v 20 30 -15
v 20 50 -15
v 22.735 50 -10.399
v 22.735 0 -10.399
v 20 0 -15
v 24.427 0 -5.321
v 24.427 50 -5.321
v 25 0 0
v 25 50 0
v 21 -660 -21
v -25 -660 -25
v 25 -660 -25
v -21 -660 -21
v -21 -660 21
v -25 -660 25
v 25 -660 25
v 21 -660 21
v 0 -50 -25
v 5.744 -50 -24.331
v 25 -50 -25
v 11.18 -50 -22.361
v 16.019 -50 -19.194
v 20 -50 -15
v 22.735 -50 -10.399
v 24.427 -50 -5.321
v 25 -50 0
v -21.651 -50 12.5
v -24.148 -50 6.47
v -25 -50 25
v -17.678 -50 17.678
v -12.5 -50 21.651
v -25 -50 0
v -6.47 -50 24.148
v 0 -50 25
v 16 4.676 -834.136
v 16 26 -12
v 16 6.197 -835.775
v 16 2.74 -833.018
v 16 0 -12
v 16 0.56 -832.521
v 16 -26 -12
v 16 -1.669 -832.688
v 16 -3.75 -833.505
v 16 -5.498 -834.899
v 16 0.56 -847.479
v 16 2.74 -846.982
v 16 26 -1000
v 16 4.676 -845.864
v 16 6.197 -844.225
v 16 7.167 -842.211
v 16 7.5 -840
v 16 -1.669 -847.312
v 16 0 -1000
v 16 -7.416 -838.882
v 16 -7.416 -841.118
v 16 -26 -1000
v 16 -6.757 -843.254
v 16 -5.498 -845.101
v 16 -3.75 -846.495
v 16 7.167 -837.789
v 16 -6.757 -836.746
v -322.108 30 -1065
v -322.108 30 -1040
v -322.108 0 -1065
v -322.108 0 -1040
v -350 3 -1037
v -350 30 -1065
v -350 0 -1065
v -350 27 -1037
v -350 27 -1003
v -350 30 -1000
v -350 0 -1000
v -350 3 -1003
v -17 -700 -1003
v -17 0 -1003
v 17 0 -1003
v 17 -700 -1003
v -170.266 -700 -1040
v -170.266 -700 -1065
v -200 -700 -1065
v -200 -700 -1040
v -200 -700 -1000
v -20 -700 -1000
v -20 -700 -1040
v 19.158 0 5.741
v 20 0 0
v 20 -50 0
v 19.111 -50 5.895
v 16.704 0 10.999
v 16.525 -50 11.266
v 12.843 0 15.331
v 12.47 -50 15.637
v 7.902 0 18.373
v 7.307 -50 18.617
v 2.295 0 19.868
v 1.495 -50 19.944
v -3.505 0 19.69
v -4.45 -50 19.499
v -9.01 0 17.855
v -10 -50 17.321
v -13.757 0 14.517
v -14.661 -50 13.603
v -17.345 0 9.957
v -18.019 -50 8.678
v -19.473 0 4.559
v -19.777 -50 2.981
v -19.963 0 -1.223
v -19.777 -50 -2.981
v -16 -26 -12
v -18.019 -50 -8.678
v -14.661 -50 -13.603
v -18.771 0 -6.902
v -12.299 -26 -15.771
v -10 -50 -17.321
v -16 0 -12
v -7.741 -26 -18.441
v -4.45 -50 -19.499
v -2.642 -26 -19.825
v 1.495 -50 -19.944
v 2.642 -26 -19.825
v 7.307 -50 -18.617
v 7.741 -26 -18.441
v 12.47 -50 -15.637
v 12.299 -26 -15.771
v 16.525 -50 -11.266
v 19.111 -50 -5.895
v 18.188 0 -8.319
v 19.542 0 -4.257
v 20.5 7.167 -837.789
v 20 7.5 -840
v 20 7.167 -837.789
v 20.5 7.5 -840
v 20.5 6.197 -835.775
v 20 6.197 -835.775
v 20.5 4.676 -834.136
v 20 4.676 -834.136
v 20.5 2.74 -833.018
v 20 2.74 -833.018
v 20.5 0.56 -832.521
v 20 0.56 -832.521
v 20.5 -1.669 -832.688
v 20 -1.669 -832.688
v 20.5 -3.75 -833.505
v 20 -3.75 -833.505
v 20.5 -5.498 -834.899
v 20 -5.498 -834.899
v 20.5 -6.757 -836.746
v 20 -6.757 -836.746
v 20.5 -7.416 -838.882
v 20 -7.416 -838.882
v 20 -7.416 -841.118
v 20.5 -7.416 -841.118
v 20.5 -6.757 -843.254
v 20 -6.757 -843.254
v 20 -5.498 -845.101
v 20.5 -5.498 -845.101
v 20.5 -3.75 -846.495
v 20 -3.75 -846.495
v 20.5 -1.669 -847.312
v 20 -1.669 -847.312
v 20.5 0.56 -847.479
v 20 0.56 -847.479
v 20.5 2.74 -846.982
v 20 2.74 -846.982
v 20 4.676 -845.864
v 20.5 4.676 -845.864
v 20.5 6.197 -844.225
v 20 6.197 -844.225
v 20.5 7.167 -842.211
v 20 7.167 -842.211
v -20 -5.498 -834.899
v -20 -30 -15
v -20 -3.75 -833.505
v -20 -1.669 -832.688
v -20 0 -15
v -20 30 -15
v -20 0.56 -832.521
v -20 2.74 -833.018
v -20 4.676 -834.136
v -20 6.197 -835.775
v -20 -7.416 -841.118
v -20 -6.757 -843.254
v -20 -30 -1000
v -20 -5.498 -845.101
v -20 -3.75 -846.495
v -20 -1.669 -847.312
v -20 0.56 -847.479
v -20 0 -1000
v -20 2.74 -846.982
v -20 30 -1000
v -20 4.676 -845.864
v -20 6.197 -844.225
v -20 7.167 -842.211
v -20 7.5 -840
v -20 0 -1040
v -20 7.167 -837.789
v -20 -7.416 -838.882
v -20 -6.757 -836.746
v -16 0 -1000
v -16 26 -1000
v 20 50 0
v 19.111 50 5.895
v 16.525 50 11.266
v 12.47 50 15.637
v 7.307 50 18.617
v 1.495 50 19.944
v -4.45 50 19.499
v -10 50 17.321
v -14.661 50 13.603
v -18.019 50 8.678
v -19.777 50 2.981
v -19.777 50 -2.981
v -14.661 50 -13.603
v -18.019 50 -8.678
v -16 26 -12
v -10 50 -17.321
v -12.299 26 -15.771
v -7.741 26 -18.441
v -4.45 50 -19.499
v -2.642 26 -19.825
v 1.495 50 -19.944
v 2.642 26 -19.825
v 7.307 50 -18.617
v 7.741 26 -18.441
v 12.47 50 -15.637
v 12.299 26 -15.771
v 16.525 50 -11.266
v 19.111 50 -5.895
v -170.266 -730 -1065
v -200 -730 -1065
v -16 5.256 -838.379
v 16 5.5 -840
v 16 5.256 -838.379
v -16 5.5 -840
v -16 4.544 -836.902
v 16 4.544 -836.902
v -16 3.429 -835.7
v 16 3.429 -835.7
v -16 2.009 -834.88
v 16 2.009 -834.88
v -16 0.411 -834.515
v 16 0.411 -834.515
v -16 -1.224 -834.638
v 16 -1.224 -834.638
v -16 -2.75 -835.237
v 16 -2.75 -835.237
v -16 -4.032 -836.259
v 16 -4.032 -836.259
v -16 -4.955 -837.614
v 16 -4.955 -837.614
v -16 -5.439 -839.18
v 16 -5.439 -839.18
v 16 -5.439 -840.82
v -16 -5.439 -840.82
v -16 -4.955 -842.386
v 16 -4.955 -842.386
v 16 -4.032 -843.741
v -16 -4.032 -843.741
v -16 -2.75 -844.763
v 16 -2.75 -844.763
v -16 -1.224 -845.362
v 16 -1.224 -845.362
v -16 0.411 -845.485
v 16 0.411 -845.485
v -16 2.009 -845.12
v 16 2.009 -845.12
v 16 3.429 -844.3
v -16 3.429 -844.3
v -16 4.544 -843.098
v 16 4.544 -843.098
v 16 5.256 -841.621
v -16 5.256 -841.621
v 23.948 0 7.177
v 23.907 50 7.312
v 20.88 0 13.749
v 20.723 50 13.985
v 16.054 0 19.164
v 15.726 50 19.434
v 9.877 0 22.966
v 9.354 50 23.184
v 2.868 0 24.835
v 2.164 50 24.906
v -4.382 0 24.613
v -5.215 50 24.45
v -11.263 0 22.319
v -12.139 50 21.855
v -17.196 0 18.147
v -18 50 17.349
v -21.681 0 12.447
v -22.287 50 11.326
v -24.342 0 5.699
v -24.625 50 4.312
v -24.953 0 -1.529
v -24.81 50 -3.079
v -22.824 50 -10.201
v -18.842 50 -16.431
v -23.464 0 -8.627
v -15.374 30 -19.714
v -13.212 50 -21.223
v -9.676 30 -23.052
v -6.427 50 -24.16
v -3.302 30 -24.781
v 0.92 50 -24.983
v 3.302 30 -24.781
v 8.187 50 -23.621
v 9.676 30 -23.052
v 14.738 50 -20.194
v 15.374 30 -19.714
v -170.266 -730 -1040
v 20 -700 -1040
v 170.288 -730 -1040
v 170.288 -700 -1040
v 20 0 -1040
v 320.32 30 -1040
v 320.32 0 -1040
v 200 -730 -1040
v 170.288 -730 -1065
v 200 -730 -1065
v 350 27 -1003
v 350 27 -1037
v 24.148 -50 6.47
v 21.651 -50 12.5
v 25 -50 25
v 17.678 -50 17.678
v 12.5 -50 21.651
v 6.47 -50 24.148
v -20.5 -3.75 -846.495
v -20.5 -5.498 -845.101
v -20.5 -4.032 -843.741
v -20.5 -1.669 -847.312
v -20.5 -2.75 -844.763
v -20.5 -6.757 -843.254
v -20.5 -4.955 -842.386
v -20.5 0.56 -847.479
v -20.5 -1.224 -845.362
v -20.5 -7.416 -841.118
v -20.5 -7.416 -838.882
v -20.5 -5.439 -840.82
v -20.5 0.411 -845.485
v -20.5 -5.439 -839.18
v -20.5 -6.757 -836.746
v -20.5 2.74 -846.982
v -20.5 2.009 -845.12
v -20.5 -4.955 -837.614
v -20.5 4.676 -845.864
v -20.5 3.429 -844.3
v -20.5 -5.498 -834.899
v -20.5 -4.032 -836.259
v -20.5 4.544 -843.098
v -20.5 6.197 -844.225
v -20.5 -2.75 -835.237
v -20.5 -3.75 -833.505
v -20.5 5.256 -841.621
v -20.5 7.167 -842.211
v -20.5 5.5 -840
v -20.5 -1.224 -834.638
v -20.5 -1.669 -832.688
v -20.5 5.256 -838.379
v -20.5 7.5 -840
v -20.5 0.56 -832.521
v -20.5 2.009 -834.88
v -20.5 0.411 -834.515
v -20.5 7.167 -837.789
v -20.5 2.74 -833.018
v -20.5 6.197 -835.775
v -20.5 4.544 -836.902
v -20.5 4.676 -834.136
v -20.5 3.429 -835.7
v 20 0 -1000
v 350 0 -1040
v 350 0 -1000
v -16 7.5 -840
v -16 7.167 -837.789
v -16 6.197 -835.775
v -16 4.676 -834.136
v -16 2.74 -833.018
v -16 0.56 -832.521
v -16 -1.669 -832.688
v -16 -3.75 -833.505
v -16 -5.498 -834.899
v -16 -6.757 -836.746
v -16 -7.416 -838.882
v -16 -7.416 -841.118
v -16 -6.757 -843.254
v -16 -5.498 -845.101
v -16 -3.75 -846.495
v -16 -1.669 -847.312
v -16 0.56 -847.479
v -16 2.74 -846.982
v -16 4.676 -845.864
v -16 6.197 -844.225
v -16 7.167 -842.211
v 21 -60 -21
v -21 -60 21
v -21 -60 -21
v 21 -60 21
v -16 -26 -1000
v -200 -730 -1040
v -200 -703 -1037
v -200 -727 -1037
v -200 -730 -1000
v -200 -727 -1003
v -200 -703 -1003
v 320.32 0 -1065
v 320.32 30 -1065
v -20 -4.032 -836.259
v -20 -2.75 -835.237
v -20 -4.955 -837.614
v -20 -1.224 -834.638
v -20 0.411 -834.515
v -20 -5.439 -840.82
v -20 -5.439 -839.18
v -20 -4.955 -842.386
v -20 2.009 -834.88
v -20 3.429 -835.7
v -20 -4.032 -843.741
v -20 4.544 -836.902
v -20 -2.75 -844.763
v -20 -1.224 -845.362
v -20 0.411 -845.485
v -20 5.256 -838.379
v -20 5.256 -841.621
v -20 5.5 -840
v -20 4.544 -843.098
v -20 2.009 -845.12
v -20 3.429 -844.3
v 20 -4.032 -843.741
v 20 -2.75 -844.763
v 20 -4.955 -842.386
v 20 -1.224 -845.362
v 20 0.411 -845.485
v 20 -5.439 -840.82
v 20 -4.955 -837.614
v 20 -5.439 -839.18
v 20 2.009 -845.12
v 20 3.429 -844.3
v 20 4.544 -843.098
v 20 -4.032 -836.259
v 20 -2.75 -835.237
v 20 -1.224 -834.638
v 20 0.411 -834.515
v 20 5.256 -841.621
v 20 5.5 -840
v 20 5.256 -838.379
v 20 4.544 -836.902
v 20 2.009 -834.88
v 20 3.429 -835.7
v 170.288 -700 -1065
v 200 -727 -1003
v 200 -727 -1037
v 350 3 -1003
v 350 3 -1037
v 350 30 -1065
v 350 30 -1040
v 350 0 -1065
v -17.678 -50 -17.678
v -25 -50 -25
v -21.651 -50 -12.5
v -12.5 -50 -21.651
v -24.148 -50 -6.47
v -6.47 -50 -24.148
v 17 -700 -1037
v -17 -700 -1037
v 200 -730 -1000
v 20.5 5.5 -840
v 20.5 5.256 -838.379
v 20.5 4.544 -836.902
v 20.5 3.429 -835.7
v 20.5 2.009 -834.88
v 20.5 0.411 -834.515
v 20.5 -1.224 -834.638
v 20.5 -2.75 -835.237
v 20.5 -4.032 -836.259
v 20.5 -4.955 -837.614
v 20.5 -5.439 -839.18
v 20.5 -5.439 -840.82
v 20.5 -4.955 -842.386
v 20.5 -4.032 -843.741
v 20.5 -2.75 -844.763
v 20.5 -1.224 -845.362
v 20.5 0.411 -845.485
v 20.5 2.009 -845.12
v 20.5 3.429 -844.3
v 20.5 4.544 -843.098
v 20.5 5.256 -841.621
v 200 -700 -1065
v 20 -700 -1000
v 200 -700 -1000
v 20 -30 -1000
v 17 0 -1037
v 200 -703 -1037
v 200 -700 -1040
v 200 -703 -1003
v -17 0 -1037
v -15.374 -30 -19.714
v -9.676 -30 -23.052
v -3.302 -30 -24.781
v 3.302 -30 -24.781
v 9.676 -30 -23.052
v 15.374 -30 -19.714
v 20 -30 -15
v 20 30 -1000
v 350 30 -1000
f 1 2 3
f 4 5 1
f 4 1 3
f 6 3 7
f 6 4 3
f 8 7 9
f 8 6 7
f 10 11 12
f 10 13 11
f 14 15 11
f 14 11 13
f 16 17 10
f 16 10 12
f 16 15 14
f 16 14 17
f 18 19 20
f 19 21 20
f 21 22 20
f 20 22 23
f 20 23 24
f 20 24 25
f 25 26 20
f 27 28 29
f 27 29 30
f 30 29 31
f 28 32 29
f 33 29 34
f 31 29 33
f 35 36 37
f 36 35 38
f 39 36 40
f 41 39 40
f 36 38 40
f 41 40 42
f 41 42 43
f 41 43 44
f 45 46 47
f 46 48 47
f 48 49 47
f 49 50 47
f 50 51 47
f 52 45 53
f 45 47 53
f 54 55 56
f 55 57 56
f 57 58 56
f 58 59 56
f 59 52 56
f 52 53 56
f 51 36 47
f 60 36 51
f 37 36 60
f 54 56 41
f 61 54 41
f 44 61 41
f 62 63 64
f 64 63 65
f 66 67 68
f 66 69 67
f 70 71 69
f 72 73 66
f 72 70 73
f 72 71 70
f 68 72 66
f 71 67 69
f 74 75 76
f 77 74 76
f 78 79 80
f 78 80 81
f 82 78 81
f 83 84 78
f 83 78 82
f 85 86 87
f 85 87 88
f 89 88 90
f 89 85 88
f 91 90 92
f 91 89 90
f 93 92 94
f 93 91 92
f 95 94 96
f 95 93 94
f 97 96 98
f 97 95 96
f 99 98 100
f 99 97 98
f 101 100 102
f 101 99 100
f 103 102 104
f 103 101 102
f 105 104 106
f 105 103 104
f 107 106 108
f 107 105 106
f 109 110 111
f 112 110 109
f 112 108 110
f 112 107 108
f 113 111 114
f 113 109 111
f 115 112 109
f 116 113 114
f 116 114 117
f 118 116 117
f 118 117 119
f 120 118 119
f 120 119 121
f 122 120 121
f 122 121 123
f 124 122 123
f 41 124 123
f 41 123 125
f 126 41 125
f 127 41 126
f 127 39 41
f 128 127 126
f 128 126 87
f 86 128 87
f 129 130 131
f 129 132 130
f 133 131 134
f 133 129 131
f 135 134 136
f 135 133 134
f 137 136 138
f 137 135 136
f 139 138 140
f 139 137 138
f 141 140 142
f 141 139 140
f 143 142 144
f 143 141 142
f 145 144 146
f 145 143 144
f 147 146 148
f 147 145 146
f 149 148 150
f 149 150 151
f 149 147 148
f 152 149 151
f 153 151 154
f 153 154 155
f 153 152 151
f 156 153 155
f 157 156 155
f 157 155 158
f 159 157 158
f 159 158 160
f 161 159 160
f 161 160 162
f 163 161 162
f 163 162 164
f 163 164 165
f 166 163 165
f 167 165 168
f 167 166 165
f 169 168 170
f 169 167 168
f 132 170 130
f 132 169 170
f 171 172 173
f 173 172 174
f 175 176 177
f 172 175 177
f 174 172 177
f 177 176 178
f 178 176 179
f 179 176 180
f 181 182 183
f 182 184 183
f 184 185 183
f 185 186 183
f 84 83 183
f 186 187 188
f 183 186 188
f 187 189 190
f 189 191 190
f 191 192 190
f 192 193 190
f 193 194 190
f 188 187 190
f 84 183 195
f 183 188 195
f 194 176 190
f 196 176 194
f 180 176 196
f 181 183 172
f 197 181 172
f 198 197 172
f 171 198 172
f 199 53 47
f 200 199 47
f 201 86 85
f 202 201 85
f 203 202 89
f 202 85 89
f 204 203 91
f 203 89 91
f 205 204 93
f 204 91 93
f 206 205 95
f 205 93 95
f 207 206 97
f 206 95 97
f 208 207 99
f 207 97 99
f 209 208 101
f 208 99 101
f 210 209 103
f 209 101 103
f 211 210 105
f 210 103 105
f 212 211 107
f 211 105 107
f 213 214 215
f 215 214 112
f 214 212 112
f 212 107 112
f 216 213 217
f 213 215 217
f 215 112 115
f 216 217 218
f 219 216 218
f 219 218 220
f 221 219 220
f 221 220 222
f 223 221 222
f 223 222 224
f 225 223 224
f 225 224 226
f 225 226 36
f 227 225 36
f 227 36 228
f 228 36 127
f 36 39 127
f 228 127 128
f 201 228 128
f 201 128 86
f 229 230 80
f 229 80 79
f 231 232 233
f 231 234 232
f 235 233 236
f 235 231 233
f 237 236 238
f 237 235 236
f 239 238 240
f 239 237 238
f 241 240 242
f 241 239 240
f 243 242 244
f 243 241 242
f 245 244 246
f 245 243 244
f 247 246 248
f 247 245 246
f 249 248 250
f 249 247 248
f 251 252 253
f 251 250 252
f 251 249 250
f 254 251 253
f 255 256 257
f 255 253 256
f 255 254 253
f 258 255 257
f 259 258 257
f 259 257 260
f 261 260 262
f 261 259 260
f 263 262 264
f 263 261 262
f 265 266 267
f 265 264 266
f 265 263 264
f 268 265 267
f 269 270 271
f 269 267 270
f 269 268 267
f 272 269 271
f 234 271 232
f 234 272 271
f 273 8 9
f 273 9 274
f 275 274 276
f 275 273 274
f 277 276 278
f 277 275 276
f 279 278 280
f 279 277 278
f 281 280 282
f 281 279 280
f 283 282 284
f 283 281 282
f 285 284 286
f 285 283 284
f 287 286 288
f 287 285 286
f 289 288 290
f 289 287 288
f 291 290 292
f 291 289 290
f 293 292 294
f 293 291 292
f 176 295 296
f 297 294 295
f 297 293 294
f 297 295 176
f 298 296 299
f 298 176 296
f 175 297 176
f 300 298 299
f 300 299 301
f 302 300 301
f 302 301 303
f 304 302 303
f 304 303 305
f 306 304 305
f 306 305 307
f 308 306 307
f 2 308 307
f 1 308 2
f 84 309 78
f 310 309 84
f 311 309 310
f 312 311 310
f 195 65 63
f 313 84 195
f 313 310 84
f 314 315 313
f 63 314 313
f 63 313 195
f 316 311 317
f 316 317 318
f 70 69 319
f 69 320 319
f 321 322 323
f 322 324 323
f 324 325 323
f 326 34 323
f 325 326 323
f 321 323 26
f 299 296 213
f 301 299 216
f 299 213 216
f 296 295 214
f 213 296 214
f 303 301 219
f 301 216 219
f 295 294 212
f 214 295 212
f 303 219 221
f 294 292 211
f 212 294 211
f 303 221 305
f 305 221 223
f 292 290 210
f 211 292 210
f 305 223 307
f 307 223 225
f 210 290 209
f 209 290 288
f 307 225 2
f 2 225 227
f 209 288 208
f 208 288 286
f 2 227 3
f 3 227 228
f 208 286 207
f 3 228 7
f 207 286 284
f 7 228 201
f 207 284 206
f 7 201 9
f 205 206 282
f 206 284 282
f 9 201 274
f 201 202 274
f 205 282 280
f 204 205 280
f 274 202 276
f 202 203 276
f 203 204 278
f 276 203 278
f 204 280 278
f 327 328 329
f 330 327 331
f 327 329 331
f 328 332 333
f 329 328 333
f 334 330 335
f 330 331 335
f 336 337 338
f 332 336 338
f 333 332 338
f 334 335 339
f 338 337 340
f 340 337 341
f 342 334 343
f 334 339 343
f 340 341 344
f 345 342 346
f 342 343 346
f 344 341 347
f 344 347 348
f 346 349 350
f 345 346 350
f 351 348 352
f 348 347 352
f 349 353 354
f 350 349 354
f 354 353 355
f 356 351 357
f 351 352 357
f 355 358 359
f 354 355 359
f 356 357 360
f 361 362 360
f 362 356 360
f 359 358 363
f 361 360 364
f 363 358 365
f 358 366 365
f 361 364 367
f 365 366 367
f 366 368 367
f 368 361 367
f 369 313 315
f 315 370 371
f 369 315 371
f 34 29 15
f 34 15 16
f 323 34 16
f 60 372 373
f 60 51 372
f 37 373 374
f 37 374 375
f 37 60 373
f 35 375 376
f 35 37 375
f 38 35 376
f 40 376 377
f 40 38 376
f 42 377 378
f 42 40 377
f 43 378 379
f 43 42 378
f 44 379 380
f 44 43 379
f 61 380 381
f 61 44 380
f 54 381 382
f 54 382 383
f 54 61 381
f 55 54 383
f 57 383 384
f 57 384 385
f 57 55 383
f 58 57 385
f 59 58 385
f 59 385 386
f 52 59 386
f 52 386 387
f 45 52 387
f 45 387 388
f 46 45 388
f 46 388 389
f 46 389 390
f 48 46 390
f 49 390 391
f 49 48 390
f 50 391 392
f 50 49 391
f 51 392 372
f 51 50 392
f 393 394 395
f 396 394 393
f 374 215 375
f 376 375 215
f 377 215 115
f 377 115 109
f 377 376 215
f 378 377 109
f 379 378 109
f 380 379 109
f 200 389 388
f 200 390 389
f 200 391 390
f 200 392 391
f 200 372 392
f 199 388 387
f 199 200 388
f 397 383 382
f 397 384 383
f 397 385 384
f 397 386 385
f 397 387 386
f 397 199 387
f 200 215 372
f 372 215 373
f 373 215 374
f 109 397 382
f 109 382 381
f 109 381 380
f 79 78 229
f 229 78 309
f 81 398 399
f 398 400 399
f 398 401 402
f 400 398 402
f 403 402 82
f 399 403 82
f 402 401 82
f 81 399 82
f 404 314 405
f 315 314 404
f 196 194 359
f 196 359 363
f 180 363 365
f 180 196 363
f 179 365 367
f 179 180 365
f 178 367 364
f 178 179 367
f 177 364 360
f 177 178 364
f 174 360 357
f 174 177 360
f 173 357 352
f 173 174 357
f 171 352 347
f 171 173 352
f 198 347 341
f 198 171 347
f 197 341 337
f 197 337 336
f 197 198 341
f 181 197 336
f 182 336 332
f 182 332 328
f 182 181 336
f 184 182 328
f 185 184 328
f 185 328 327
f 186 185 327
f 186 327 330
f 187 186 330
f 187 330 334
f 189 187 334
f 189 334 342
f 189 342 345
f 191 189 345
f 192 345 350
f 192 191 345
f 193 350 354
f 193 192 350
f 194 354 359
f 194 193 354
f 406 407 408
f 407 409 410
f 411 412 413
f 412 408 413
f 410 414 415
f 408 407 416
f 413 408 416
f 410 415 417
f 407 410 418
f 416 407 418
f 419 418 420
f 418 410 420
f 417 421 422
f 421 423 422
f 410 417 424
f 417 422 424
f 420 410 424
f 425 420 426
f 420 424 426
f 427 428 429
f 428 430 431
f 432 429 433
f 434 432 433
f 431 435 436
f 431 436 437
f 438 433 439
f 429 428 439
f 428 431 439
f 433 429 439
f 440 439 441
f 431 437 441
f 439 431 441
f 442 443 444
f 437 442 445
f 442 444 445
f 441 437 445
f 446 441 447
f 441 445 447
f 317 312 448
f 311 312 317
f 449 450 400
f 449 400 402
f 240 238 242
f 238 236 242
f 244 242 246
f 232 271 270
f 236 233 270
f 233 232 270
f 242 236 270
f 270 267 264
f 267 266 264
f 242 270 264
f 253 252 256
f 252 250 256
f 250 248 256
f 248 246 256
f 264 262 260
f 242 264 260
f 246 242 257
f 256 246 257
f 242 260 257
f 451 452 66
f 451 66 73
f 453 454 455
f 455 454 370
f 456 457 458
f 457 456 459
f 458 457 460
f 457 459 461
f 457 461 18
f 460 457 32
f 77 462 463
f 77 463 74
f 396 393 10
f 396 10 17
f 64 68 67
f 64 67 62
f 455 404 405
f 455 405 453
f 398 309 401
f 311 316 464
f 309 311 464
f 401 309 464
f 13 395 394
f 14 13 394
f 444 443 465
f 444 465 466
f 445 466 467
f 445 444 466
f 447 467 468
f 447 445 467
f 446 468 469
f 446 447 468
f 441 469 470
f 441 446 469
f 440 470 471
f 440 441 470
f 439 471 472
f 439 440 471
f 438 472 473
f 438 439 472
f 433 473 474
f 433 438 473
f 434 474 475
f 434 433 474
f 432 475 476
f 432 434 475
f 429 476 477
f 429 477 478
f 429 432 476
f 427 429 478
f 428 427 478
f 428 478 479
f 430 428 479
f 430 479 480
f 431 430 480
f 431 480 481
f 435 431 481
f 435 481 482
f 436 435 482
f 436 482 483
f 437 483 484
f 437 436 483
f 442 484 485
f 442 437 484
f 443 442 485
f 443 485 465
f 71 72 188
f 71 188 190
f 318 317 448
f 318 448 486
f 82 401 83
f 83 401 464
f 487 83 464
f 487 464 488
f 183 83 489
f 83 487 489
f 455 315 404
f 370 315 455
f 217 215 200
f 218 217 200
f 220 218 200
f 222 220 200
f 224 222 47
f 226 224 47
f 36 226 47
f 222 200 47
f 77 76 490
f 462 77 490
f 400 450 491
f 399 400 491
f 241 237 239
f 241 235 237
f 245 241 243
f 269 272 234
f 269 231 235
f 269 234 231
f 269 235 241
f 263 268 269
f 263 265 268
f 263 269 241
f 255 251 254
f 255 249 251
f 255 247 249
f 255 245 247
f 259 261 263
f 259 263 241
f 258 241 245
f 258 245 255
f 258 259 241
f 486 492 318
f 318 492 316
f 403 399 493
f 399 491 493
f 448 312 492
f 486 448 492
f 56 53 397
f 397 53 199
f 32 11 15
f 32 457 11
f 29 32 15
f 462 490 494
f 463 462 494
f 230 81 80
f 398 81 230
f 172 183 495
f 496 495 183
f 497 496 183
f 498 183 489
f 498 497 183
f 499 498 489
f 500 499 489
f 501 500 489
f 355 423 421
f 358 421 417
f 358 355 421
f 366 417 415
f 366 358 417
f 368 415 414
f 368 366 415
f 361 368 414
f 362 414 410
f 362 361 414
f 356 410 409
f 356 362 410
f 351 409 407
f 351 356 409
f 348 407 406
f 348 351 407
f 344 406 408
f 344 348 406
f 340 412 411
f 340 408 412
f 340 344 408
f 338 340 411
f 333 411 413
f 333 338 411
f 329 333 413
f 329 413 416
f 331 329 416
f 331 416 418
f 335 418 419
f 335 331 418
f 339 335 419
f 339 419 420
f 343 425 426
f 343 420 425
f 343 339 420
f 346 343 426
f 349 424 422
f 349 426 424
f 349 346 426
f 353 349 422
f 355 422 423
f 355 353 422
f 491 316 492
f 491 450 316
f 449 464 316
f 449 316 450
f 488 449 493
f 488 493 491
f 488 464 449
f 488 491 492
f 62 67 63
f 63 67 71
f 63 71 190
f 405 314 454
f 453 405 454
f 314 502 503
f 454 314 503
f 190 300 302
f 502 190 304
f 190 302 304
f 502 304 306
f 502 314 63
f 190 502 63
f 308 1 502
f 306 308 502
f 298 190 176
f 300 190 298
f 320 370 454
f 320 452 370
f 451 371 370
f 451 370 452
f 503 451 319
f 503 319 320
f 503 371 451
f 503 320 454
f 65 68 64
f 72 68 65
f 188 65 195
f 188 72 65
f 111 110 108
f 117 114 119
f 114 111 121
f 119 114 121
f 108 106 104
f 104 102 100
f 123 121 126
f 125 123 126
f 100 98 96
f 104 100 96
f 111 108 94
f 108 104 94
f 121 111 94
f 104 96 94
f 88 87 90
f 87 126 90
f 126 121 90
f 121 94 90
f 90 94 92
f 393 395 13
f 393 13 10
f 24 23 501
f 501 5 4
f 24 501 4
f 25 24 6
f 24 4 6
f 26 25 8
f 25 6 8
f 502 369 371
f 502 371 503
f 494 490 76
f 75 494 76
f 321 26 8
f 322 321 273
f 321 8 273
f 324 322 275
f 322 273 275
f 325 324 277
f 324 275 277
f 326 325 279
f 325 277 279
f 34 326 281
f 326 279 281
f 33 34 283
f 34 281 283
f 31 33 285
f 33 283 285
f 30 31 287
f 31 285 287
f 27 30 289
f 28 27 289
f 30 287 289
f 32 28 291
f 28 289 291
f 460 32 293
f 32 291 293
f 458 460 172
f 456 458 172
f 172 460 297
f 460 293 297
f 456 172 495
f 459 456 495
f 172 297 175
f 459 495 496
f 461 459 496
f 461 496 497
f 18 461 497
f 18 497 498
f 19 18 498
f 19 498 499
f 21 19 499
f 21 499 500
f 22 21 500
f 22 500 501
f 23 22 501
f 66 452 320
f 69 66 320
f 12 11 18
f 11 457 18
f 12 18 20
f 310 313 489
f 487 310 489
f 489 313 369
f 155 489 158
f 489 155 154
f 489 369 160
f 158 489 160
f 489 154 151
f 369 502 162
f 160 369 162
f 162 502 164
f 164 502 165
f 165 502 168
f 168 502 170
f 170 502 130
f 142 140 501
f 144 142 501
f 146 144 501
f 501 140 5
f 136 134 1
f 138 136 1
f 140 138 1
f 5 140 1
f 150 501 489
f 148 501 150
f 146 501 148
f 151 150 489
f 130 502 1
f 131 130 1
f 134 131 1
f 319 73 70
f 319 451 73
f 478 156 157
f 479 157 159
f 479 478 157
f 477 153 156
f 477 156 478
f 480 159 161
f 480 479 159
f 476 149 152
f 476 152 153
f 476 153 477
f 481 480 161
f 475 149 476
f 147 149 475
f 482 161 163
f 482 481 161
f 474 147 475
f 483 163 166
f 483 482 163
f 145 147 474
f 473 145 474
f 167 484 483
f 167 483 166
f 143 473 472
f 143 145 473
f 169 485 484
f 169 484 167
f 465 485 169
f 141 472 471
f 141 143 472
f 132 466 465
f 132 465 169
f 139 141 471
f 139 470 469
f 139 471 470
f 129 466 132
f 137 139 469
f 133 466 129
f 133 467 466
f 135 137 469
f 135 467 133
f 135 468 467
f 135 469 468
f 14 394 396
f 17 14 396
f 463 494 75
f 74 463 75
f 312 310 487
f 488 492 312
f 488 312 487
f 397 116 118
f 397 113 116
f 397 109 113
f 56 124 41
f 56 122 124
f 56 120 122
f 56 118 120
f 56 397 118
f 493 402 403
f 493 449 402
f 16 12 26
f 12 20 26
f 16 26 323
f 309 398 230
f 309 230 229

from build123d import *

# Parameters (mm, degrees)
F0_R      = 20
F1_DEPTH  = 50
F2_DEPTH  = 30
F3_W      = 32
F3_H      = 52
F4_DEPTH  = 988.001
F5_W      = 30
F5_H      = 40
F5_W_2    = 24
F5_H_2    = 34
F6_DEPTH  = 350
F8_DEPTH  = 700
F9_DEPTH  = 200
F10_W     = 27.8917610645
F10_H     = 30
F10_W_2   = 29.6796619892
F10_W_3   = 29.7341316938
F10_W_4   = 29.711586237
F11_DEPTH = 25
F12_W     = 50
F12_H     = 50
F13_DEPTH = 10
F14_W     = 50
F14_H     = 50
F14_W_2   = 42
F14_H_2   = 42
F15_DEPTH = 600
F16_R     = 7.5
F16_R_2   = 5.5
F17_DEPTH = 20.5


# Not quite as in the source:
# - the program builds the solid bodies; features that only make, move or delete a surface that nothing else refers to are left out


with BuildPart() as f1:
    # F0 (on Front) → F1 (new body, symmetric)
    with BuildSketch(Plane.XZ):
        with BuildLine():
            ThreePointArc((20, -15), (23.7170824513, -7.9056941504), (25, 0))
            ThreePointArc((25, 0), (-7.9056941504, 23.7170824513), (-20, -15))
            ThreePointArc((-20, -15), (0, -25), (20, -15))
        make_face()
        Circle(F0_R, mode=Mode.SUBTRACT)
    extrude(amount=F1_DEPTH, both=True)

    # F0 (on Front) → F2 (join, symmetric)
    with BuildSketch(Plane.XZ):
        with BuildLine():
            ThreePointArc((20, -15), (0, -25), (-20, -15))
            Line((-20, -15), (-20, -1000))
            Line((-20, -1000), (20, -1000))
            Line((20, -1000), (20, -15))
        make_face()
    extrude(amount=F2_DEPTH, both=True)

    # F3 (on face) → F4 (cut, through all)
    with BuildSketch(Plane(origin=(0, 0, -1000), x_dir=(1, 0, 0), z_dir=(0, 0, -1))):
        Rectangle(F3_W, F3_H)
    extrude(amount=-F4_DEPTH, mode=Mode.SUBTRACT)

    # F5 (on Right) → F6 (join, symmetric)
    with BuildSketch(Plane.YZ):
        with Locations((15, -1020)):
            Rectangle(F5_W, F5_H)
        with Locations((15, -1020)):
            Rectangle(F5_W_2, F5_H_2, mode=Mode.SUBTRACT)
    extrude(amount=F6_DEPTH, both=True)

    # F7 (on face) → F8 (join)
    with BuildSketch(Plane.XZ):
        Polygon((-16, -1000), (-20, -1000), (-20, -1020), (-20, -1040), (20, -1040), (20, -1000), (16, -1000), align=None)
        Polygon((-17, -1037), (-17, -1020), (-17, -1003), (17, -1003), (17, -1037), align=None, mode=Mode.SUBTRACT)
    extrude(amount=F8_DEPTH)

    # F5 (on Right) → F9 (join, symmetric)
    with BuildSketch(Plane.YZ):
        with Locations((-715, -1020)):
            Rectangle(F5_W, F5_H)
        with Locations((-715, -1020)):
            Rectangle(F5_W_2, F5_H_2, mode=Mode.SUBTRACT)
    extrude(amount=F9_DEPTH, both=True)

    # F10 (on face) → F11 (join)
    with BuildSketch(Plane(origin=(0, 0, -1040), x_dir=(1, 0, 0), z_dir=(0, 0, -1))):
        with Locations((-336.0541194677, -15)):
            Rectangle(F10_W, F10_H)
        with Locations((335.1601690054, -15)):
            Rectangle(F10_W_2, F10_H)
        with Locations((-185.1329341531, 715)):
            Rectangle(F10_W_3, F10_H)
        with Locations((185.1442068815, 715)):
            Rectangle(F10_W_4, F10_H)
    extrude(amount=F11_DEPTH)

    # F12 (on face) → F13 (join)
    with BuildSketch(Plane.XZ.offset(50)):
        Rectangle(F12_W, F12_H)
    extrude(amount=F13_DEPTH)

    # F14 (on face) → F15 (join)
    with BuildSketch(Plane.XZ.offset(60)):
        Rectangle(F14_W, F14_H)
        Rectangle(F14_W_2, F14_H_2, mode=Mode.SUBTRACT)
    extrude(amount=F15_DEPTH)

    # F16 (on Right) → F17 (join, symmetric)
    with BuildSketch(Plane.YZ):
        with Locations((0, -840)):
            Circle(F16_R)
        with Locations((0, -840)):
            Circle(F16_R_2, mode=Mode.SUBTRACT)
    extrude(amount=F17_DEPTH, both=True)


solid = f1.part
